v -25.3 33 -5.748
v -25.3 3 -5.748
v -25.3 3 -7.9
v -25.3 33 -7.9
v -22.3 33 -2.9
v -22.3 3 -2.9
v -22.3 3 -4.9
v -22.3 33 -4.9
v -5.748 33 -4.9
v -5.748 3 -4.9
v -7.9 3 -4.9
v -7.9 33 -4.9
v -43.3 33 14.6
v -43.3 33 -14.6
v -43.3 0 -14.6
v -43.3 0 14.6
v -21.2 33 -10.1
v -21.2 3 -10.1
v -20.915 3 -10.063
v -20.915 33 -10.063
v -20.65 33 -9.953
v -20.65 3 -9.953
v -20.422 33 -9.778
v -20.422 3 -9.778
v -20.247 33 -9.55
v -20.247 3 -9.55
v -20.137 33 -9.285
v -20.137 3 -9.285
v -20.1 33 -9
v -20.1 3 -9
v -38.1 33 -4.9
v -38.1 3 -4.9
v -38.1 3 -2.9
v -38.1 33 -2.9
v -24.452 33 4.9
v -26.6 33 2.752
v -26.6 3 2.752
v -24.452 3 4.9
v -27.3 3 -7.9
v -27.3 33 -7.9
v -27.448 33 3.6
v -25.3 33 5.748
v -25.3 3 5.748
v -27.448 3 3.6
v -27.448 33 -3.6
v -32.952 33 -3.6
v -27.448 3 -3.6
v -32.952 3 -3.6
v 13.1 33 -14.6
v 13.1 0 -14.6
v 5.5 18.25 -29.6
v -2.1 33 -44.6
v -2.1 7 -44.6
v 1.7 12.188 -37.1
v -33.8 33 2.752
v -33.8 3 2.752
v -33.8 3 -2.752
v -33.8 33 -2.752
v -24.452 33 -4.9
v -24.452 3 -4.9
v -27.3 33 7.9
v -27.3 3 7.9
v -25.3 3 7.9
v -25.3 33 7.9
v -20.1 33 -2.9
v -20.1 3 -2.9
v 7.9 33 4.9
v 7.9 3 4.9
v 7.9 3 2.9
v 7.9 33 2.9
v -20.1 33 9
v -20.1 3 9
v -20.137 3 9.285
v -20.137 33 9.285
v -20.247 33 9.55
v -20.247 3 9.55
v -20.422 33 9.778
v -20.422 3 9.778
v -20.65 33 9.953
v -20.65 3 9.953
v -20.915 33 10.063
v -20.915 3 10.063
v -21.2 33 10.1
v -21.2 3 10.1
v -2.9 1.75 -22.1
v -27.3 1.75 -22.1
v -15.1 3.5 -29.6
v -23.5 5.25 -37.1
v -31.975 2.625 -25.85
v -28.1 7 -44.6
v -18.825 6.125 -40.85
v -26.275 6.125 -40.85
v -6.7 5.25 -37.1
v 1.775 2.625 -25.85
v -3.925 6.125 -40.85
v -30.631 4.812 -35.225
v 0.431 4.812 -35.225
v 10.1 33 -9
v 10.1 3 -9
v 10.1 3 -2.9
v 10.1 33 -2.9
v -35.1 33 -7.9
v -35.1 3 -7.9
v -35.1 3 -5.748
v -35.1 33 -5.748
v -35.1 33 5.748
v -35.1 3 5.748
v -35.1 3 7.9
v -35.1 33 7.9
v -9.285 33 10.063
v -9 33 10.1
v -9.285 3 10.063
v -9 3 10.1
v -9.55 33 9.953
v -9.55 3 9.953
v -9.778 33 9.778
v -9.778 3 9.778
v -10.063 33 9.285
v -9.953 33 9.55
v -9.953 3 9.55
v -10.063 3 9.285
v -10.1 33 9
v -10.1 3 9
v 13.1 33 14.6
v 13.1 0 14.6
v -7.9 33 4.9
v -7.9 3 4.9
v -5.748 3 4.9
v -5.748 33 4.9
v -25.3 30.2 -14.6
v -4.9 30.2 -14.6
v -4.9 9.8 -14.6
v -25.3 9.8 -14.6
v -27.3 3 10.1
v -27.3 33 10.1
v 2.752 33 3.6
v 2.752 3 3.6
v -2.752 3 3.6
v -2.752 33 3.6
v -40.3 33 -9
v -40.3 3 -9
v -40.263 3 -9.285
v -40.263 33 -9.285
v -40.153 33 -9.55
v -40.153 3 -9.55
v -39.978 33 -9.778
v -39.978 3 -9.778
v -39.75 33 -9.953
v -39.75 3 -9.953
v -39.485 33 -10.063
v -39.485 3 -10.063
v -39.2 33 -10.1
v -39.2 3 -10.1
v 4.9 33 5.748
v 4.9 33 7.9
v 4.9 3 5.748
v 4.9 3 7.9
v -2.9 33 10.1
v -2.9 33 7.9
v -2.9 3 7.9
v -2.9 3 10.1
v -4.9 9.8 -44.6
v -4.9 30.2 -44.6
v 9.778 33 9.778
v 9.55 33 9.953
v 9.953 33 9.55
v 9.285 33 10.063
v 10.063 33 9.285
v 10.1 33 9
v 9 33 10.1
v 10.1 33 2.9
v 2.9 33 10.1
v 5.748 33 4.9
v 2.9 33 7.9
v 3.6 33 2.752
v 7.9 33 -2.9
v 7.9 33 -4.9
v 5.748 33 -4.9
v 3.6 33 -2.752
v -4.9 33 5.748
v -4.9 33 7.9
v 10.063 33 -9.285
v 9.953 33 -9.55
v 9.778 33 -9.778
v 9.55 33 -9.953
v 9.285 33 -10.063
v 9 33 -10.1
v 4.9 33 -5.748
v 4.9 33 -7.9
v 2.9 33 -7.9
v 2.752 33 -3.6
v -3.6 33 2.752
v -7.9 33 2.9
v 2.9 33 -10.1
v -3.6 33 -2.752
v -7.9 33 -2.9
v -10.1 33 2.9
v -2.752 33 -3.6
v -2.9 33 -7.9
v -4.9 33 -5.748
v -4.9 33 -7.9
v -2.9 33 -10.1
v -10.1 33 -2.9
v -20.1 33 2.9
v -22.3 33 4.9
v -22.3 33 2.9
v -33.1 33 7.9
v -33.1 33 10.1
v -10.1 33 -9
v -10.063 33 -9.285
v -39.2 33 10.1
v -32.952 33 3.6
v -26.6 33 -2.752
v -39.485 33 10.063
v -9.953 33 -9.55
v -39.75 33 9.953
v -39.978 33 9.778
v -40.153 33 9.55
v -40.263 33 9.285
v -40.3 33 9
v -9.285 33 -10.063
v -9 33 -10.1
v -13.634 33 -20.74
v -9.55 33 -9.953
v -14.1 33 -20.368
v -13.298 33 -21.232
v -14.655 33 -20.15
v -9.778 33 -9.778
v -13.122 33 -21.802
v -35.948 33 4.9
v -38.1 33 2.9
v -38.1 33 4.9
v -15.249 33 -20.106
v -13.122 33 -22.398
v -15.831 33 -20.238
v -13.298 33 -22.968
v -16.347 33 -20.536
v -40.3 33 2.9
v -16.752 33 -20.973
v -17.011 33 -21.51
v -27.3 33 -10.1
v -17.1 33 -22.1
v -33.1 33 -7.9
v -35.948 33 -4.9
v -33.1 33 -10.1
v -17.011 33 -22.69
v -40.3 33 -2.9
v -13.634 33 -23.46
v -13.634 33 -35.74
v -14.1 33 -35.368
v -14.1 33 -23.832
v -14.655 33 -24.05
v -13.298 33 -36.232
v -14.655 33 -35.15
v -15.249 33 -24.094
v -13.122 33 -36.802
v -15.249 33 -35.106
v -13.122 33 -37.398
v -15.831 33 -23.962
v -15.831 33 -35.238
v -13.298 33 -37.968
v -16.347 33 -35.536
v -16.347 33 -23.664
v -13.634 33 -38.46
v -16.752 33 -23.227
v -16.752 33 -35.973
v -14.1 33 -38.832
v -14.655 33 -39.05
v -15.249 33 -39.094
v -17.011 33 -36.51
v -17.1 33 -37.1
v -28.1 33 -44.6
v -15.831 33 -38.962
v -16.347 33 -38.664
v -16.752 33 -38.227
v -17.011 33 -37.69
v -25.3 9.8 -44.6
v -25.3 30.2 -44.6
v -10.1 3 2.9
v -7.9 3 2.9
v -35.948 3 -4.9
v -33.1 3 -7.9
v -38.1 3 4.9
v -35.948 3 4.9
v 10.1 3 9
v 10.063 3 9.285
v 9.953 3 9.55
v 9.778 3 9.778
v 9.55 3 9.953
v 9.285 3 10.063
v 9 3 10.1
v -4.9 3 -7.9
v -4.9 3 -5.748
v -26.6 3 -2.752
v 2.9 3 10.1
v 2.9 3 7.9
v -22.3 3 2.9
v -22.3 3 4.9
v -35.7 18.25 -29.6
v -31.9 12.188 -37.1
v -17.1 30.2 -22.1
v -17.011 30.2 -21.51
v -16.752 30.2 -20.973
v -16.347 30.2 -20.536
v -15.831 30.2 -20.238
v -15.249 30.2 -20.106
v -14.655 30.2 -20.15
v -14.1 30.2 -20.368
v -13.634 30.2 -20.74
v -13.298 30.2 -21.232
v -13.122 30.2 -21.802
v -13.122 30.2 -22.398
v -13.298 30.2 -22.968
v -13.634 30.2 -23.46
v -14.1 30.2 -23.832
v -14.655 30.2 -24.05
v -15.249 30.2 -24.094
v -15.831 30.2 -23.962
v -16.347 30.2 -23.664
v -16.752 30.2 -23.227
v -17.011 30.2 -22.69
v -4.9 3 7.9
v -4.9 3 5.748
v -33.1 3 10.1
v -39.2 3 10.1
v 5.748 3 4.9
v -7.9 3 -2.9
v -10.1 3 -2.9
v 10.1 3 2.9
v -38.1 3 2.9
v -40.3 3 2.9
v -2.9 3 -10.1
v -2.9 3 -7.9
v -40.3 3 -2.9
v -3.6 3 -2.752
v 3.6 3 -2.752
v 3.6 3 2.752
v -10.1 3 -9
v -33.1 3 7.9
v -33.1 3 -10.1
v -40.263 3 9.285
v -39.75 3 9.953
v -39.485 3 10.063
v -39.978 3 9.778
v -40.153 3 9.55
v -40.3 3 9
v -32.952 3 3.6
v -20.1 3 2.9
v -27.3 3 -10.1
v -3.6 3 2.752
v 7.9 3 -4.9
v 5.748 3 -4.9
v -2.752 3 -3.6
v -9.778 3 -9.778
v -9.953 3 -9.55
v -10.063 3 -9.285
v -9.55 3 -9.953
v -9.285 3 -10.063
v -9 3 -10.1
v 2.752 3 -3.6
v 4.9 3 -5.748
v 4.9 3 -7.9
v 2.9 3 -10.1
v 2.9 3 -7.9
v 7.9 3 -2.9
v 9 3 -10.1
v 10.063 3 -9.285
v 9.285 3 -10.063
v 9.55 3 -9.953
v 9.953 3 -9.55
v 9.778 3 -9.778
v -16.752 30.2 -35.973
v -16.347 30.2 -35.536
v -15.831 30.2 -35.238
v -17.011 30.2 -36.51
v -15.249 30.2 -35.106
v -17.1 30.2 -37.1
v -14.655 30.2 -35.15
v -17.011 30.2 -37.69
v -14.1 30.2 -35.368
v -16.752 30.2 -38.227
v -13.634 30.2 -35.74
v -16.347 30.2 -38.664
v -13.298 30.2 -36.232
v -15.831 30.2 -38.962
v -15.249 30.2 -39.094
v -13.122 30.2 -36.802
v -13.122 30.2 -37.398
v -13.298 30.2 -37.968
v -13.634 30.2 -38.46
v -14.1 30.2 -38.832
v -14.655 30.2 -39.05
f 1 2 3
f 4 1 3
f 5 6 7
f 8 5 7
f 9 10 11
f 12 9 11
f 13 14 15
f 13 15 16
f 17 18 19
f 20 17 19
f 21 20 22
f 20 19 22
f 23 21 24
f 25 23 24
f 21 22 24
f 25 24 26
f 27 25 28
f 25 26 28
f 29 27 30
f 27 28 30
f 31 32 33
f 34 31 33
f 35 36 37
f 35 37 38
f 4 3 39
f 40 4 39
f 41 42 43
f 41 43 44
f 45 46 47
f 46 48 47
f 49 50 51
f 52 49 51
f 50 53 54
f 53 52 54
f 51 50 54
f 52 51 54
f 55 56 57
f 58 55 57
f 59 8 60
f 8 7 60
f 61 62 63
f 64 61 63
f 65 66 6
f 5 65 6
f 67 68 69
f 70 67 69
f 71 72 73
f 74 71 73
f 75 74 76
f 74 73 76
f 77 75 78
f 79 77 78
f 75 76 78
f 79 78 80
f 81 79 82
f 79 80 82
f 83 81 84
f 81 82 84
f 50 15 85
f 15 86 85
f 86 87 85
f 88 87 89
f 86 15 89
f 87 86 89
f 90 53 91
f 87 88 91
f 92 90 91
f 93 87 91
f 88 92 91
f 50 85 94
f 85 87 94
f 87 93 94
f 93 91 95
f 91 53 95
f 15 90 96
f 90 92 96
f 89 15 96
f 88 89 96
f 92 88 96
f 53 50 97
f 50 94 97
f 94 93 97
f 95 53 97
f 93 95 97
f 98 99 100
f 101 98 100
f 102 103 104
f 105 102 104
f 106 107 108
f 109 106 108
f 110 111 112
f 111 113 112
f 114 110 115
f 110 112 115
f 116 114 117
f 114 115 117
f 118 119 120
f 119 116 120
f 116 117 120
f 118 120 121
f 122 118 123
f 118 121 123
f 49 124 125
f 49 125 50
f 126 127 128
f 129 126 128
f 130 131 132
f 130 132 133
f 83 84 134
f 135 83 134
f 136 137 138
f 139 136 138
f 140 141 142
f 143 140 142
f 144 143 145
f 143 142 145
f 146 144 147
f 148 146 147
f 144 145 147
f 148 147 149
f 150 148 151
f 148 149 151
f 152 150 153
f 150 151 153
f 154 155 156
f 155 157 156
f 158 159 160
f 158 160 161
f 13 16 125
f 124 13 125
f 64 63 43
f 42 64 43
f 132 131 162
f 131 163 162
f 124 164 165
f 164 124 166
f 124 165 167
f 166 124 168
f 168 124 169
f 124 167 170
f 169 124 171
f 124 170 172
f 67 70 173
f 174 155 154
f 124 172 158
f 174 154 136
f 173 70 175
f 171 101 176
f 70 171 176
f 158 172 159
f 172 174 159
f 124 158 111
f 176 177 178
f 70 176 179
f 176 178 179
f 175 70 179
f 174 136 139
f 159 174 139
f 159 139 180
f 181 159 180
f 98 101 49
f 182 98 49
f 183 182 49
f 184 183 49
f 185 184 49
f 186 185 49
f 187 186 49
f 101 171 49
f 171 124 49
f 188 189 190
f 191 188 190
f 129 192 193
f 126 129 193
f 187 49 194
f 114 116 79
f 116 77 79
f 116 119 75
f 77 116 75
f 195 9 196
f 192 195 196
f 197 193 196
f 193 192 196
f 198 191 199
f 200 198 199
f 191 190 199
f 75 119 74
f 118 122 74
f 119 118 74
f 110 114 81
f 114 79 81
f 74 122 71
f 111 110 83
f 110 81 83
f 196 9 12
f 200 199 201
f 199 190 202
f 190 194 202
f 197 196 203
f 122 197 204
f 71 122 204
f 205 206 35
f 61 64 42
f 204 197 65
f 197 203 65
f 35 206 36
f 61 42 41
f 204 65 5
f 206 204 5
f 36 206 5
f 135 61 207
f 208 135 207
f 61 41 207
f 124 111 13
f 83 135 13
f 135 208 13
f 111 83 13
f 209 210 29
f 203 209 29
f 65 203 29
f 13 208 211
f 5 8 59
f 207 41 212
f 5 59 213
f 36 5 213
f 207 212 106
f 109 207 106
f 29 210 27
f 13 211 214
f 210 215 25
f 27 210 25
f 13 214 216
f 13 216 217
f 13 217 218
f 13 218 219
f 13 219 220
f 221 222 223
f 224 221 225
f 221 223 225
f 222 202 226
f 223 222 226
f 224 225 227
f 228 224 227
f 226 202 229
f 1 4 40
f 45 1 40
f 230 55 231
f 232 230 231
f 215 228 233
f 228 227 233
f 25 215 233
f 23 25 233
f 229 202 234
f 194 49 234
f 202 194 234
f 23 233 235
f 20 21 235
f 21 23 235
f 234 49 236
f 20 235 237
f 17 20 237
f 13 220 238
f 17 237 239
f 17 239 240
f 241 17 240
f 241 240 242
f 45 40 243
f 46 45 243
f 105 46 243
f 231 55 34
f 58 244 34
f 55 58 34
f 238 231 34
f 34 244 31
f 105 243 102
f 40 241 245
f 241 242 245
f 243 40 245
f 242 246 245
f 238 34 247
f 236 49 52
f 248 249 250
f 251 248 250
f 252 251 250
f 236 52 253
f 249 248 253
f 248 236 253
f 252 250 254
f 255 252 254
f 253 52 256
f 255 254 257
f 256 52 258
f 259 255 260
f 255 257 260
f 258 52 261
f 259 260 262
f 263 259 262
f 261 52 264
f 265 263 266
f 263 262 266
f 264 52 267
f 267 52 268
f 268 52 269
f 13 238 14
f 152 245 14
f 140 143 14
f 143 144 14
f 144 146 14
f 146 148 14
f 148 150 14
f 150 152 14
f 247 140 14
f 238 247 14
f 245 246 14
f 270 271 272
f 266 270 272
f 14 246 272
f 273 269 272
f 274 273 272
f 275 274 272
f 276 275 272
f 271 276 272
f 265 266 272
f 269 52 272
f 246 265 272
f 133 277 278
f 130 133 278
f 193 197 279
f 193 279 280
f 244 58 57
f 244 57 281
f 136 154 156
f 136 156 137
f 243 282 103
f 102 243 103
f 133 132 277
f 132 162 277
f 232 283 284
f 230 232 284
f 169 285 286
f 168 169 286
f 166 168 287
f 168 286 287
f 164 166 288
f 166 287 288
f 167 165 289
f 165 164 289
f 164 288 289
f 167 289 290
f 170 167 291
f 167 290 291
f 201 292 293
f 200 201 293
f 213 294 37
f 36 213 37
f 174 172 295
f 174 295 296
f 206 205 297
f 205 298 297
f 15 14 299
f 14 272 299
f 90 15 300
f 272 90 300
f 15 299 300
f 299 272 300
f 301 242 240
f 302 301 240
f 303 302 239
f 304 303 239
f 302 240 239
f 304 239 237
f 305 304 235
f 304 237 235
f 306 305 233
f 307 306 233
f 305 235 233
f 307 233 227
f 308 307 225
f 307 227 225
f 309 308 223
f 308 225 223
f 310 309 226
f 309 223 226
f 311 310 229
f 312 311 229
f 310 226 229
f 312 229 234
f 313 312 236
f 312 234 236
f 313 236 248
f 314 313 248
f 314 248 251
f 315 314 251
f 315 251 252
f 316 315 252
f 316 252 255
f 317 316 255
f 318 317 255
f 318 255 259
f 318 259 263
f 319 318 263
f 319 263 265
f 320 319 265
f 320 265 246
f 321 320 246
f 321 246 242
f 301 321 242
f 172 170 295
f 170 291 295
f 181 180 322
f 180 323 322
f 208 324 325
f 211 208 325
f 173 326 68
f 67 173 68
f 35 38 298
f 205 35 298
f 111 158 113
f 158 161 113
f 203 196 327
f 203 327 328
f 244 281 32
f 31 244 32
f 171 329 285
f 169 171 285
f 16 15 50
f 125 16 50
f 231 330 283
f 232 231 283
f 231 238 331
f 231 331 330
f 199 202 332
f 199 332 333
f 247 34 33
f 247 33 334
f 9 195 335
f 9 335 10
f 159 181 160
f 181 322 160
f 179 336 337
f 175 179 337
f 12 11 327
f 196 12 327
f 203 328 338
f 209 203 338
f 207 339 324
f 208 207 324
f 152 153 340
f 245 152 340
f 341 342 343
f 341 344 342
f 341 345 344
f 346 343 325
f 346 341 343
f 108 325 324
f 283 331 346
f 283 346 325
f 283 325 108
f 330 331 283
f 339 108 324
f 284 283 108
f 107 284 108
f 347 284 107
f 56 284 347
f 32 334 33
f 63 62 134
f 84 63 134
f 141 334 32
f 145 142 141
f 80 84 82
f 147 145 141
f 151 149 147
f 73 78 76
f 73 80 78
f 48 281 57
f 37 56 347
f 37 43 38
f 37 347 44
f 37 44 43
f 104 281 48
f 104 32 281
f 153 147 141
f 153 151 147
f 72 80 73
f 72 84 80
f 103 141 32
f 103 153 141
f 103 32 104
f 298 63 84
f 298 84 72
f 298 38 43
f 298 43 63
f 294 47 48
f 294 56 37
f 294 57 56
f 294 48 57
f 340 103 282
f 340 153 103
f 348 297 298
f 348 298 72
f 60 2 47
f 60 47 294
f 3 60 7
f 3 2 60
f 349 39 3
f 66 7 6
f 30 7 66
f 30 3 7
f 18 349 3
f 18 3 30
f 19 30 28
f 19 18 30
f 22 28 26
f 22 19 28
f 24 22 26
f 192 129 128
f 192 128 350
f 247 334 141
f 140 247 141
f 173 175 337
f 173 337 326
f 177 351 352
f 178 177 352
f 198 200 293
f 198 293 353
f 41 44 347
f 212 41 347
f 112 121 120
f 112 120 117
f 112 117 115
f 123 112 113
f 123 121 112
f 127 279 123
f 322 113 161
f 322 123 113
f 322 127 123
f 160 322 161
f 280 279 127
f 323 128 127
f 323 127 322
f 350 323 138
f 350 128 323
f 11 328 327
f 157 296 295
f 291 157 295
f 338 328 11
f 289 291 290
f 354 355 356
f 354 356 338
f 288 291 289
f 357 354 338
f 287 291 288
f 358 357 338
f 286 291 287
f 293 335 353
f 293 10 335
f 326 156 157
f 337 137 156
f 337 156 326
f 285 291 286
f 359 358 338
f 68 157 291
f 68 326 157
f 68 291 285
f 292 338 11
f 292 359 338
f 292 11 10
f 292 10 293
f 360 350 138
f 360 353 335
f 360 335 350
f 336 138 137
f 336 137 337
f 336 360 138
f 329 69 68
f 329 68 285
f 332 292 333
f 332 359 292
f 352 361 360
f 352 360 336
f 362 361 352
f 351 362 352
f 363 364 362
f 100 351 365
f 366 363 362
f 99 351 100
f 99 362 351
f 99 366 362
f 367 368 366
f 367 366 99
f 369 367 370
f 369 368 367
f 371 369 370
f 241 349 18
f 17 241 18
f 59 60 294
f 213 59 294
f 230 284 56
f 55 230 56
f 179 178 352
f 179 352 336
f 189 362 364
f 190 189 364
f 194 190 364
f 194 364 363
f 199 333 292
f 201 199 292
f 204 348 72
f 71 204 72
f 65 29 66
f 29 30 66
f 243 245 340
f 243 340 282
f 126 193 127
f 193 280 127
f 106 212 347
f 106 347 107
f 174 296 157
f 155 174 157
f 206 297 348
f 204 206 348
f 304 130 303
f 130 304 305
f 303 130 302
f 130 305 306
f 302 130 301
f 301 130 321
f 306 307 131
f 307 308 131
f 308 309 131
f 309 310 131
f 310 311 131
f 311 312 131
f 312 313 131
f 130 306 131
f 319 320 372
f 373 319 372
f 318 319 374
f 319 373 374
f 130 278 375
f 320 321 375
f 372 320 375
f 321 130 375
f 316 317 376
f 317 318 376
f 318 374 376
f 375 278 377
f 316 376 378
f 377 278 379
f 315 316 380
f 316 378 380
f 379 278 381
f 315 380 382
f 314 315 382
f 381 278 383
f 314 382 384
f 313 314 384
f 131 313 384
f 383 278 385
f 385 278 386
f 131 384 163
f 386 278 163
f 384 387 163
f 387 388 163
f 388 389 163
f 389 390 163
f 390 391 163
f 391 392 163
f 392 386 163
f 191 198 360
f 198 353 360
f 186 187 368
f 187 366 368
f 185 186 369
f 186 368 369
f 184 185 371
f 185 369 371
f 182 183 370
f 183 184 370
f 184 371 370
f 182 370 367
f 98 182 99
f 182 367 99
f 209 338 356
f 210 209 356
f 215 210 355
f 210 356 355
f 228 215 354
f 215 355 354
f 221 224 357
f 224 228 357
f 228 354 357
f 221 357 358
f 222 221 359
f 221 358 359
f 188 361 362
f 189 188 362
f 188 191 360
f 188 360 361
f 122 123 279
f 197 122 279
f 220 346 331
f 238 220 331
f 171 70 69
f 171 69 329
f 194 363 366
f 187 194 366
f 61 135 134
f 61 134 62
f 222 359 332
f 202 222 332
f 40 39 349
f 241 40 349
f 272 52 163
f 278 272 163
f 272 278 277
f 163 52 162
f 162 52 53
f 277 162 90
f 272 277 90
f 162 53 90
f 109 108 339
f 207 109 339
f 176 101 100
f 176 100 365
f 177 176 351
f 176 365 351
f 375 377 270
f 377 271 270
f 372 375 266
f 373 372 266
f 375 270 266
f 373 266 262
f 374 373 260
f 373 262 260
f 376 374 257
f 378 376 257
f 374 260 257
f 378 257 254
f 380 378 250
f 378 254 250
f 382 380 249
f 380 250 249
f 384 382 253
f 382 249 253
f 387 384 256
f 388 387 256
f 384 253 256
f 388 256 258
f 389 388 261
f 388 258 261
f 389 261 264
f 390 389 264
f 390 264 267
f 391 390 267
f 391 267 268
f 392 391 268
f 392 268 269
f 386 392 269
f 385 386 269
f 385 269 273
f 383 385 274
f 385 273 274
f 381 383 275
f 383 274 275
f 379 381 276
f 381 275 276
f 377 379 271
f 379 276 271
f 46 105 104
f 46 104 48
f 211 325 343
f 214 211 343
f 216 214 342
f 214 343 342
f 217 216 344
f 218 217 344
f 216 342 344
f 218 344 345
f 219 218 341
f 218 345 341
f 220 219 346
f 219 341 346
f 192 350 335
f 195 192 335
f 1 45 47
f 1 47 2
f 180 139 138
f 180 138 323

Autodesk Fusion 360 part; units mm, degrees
sketch "Sketch1" plane through (0, 0, 0) normal (0, 1, 0) x (1, 0, 0)
  line L0 (7.9, 2.9) -> (7.9, 4.9)
  line L1 (-2.7515, -3.6) -> (-4.9, -5.7485)
  line L2 (2.9, -7.9) -> (4.9, -7.9)
  line L3 (-2.9, -7.9) -> (-2.9, -10.1)
  arc A0 (-10.1, -9) -> (-9, -10.1) centre (-9, -9) ccw
  line L4 (5.7485, 4.9) -> (3.6, 2.7515)
  line L5 (-7.9, 2.9) -> (-10.1, 2.9)
  line L6 (-4.9, -7.9) -> (-2.9, -7.9)
  line L7 (4.9, 5.7485) -> (4.9, 7.9)
  line L8 (10.1, 2.9) -> (7.9, 2.9)
  line L9 (9, -10.1) -> (2.9, -10.1)
  arc A1 (9, -10.1) -> (10.1, -9) centre (9, -9) ccw
  line L10 (4.9, -5.7485) -> (2.7515, -3.6)
  line L11 (5.7485, -4.9) -> (7.9, -4.9)
  line L12 (-10.1, 2.9) -> (-10.1, 9)
  line L13 (7.9, -2.9) -> (10.1, -2.9)
  line L14 (-3.6, 2.7515) -> (-5.7485, 4.9)
  line L15 (10.1, -2.9) -> (10.1, -9)
  line L16 (-2.9, 10.1) -> (-2.9, 7.9)
  line L17 (7.9, -4.9) -> (7.9, -2.9)
  line L18 (-3.6, -2.7515) -> (-3.6, 2.7515)
  line L19 (3.6, 2.7515) -> (3.6, -2.7515)
  line L20 (2.7515, -3.6) -> (-2.7515, -3.6)
  line L21 (-10.1, -9) -> (-10.1, -2.9)
  line L22 (10.1, 9) -> (10.1, 2.9)
  line L23 (2.9, 7.9) -> (2.9, 10.1)
  line L24 (7.9, 4.9) -> (5.7485, 4.9)
  line L25 (-2.9, -10.1) -> (-9, -10.1)
  line L26 (-2.7515, 3.6) -> (2.7515, 3.6)
  arc A2 (-9, 10.1) -> (-10.1, 9) centre (-9, 9) ccw
  line L27 (4.9, 7.9) -> (2.9, 7.9)
  line L28 (-7.9, -4.9) -> (-5.7485, -4.9)
  line L29 (2.9, 10.1) -> (9, 10.1)
  arc A3 (10.1, 9) -> (9, 10.1) centre (9, 9) ccw
  line L30 (-4.9, -5.7485) -> (-4.9, -7.9)
  line L31 (-7.9, -2.9) -> (-7.9, -4.9)
  line L32 (-4.9, 7.9) -> (-4.9, 5.7485)
  line L33 (2.7515, 3.6) -> (4.9, 5.7485)
  line L34 (-4.9, 5.7485) -> (-2.7515, 3.6)
  line L35 (-10.1, -2.9) -> (-7.9, -2.9)
  line L36 (3.6, -2.7515) -> (5.7485, -4.9)
  line L37 (4.9, -7.9) -> (4.9, -5.7485)
  line L38 (2.9, -10.1) -> (2.9, -7.9)
  line L39 (-5.7485, -4.9) -> (-3.6, -2.7515)
  line L40 (-7.9, 4.9) -> (-7.9, 2.9)
  line L41 (-2.9, 7.9) -> (-4.9, 7.9)
  line L42 (-9, 10.1) -> (-2.9, 10.1)
  line L43 (-5.7485, 4.9) -> (-7.9, 4.9)
  line L44 (-15.1, -14.6) -> (13.1, -14.6)
  line L45 (13.1, -14.6) -> (13.1, 14.6)
  line L46 (13.1, 14.6) -> (-15.1, 14.6)
  line L47 (-15.1, 14.6) -> (-15.1, -14.6)
  dimension "d1" = 3
  dimension "d2" = 5
  dimension "d3" = 4.5
  dimension "d4" = 4.5
extrude "Extrude1" add sketch "Sketch1" along normal blind 3 contours L0 L1 L2 L3 A0 L4 L5 L6 L7 L8 L9 A1 L10 L11 L12 L13 L14 L15 L16 L17 L18 L19 L20 L21 L22 L23 L24 L25 L26 A2 L27 L28 L29 A3 L30 L31 L32 L33 L34 L35 L36 L37 L38 L39 L40 L41 L42 L43 | L44 L45 L46 L47
extrude "Extrude2" add sketch "Sketch1" along normal blind 30 from surface at 3
mirror "Mirror1" about plane through (-15.1, 3, -14.6) normal (-1, 0, 0) of bodies 1 merged
ref_plane "WorkPlane1" through (-15.1, 16.5, -44.6) normal (0, 0, -1) x (-1, 0, 0)
sketch "Sketch2" plane through (0, 0, -44.6) normal (0, 0, -1) x (-1, 0, 0)
  line L0 (-13.1, 0) -> (43.3, 0)
  line L1 (43.3, 0) -> (43.3, 33)
  line L2 (43.3, 33) -> (-13.1, 33)
  line L3 (-13.1, 33) -> (-13.1, 0)
  line L4 (28.1, 33) -> (2.1, 33)
  line L5 (2.1, 33) -> (2.1, 7)
  line L6 (2.1, 7) -> (28.1, 7)
  line L7 (28.1, 7) -> (28.1, 33)
  line L8 (15.1, 33) -> (15.1, 0) construction
  line L9 (25.3, 30.2) -> (4.9, 30.2)
  line L10 (4.9, 30.2) -> (4.9, 9.8)
  line L11 (4.9, 9.8) -> (25.3, 9.8)
  line L12 (25.3, 9.8) -> (25.3, 30.2)
  dimension "d15" = 20.4
  dimension "d17" = 2.8
  dimension "d18" = 2.8
  dimension "d29" = 2.8
loft "Loft1" add profiles "Sketch2" section 1 face at (-5.7, 11, -14.6) section 2 contours L2 L4 L5 L6 L7 | L9 L10 L11 L12
extrude "Extrude3" cut sketch "Sketch2" against normal blind 30 contours L9 L10 L11 L12
sketch "Sketch3" plane through (0, 33, 0) normal (0, 1, 0) x (-1, 0, 0)
  line L0 (21.2, 10.1) -> (27.3, 10.1)
  line L1 (27.3, 10.1) -> (27.3, 7.9)
  line L2 (27.3, 7.9) -> (25.3, 7.9)
  line L3 (25.3, 7.9) -> (25.3, 5.7485)
  line L4 (25.3, 5.7485) -> (27.4485, 3.6)
  line L5 (27.4485, 3.6) -> (32.9515, 3.6)
  line L6 (32.9515, 3.6) -> (35.1, 5.7485)
  line L7 (35.1, 5.7485) -> (35.1, 7.9)
  line L8 (35.1, 7.9) -> (33.1, 7.9)
  line L9 (33.1, 7.9) -> (33.1, 10.1)
  line L10 (33.1, 10.1) -> (39.2, 10.1)
  arc A0 (40.3, 9) -> (39.2, 10.1) centre (39.2, 9) ccw
  line L11 (40.3, 9) -> (40.3, 2.9)
  line L12 (40.3, 2.9) -> (38.1, 2.9)
  line L13 (38.1, 2.9) -> (38.1, 4.9)
  line L14 (38.1, 4.9) -> (35.9485, 4.9)
  line L15 (35.9485, 4.9) -> (33.8, 2.7515)
  line L16 (33.8, 2.7515) -> (33.8, -2.7515)
  line L17 (33.8, -2.7515) -> (35.9485, -4.9)
  line L18 (35.9485, -4.9) -> (38.1, -4.9)
  line L19 (38.1, -4.9) -> (38.1, -2.9)
  line L20 (38.1, -2.9) -> (40.3, -2.9)
  line L21 (40.3, -2.9) -> (40.3, -9)
  arc A1 (39.2, -10.1) -> (40.3, -9) centre (39.2, -9) ccw
  line L22 (39.2, -10.1) -> (33.1, -10.1)
  line L23 (33.1, -10.1) -> (33.1, -7.9)
  line L24 (33.1, -7.9) -> (35.1, -7.9)
  line L25 (35.1, -7.9) -> (35.1, -5.7485)
  line L26 (35.1, -5.7485) -> (32.9515, -3.6)
  line L27 (32.9515, -3.6) -> (27.4485, -3.6)
  line L28 (27.4485, -3.6) -> (25.3, -5.7485)
  line L29 (25.3, -5.7485) -> (25.3, -7.9)
  line L30 (25.3, -7.9) -> (27.3, -7.9)
  line L31 (27.3, -7.9) -> (27.3, -10.1)
  line L32 (27.3, -10.1) -> (21.2, -10.1)
  arc A2 (20.1, -9) -> (21.2, -10.1) centre (21.2, -9) ccw
  line L33 (20.1, -9) -> (20.1, -2.9)
  line L34 (20.1, -2.9) -> (22.3, -2.9)
  line L35 (22.3, -2.9) -> (22.3, -4.9)
  line L36 (22.3, -4.9) -> (24.4515, -4.9)
  line L37 (24.4515, -4.9) -> (26.6, -2.7515)
  line L38 (26.6, -2.7515) -> (26.6, 2.7515)
  line L39 (26.6, 2.7515) -> (24.4515, 4.9)
  line L40 (24.4515, 4.9) -> (22.3, 4.9)
  line L41 (22.3, 4.9) -> (22.3, 2.9)
  line L42 (22.3, 2.9) -> (20.1, 2.9)
  line L43 (20.1, 2.9) -> (20.1, 9)
  arc A3 (21.2, 10.1) -> (20.1, 9) centre (21.2, 9) ccw
  line L44 (2.9, 10.1) -> (9, 10.1)
  arc A4 (10.1, 9) -> (9, 10.1) centre (9, 9) ccw
  line L45 (10.1, 9) -> (10.1, 2.9)
  line L46 (10.1, 2.9) -> (7.9, 2.9)
  line L47 (7.9, 2.9) -> (7.9, 4.9)
  line L48 (7.9, 4.9) -> (5.7485, 4.9)
  line L49 (5.7485, 4.9) -> (3.6, 2.7515)
  line L50 (3.6, 2.7515) -> (3.6, -2.7515)
  line L51 (3.6, -2.7515) -> (5.7485, -4.9)
  line L52 (5.7485, -4.9) -> (7.9, -4.9)
  line L53 (7.9, -4.9) -> (7.9, -2.9)
  line L54 (7.9, -2.9) -> (10.1, -2.9)
  line L55 (10.1, -2.9) -> (10.1, -9)
  arc A5 (9, -10.1) -> (10.1, -9) centre (9, -9) ccw
  line L56 (9, -10.1) -> (2.9, -10.1)
  line L57 (2.9, -10.1) -> (2.9, -7.9)
  line L58 (2.9, -7.9) -> (4.9, -7.9)
  line L59 (4.9, -7.9) -> (4.9, -5.7485)
  line L60 (4.9, -5.7485) -> (2.7515, -3.6)
  line L61 (2.7515, -3.6) -> (-2.7515, -3.6)
  line L62 (-2.7515, -3.6) -> (-4.9, -5.7485)
  line L63 (-4.9, -5.7485) -> (-4.9, -7.9)
  line L64 (-4.9, -7.9) -> (-2.9, -7.9)
  line L65 (-2.9, -7.9) -> (-2.9, -10.1)
  line L66 (-2.9, -10.1) -> (-9, -10.1)
  arc A6 (-10.1, -9) -> (-9, -10.1) centre (-9, -9) ccw
  line L67 (-10.1, -9) -> (-10.1, -2.9)
  line L68 (-10.1, -2.9) -> (-7.9, -2.9)
  line L69 (-7.9, -2.9) -> (-7.9, -4.9)
  line L70 (-7.9, -4.9) -> (-5.7485, -4.9)
  line L71 (-5.7485, -4.9) -> (-3.6, -2.7515)
  line L72 (-3.6, -2.7515) -> (-3.6, 2.7515)
  line L73 (-3.6, 2.7515) -> (-5.7485, 4.9)
  line L74 (-5.7485, 4.9) -> (-7.9, 4.9)
  line L75 (-7.9, 4.9) -> (-7.9, 2.9)
  line L76 (-7.9, 2.9) -> (-10.1, 2.9)
  line L77 (-10.1, 2.9) -> (-10.1, 9)
  arc A7 (-9, 10.1) -> (-10.1, 9) centre (-9, 9) ccw
  line L78 (-9, 10.1) -> (-2.9, 10.1)
  line L79 (-2.9, 10.1) -> (-2.9, 7.9)
  line L80 (-2.9, 7.9) -> (-4.9, 7.9)
  line L81 (-4.9, 7.9) -> (-4.9, 5.7485)
  line L82 (-4.9, 5.7485) -> (-2.7515, 3.6)
  line L83 (-2.7515, 3.6) -> (2.7515, 3.6)
  line L84 (2.7515, 3.6) -> (4.9, 5.7485)
  line L85 (4.9, 5.7485) -> (4.9, 7.9)
  line L86 (4.9, 7.9) -> (2.9, 7.9)
  line L87 (2.9, 7.9) -> (2.9, 10.1)
  line L88 (43.3, -14.6) -> (43.3, 14.6)
  line L89 (43.3, 14.6) -> (-13.1, 14.6)
  line L90 (-13.1, 14.6) -> (-13.1, -14.6)
  line L91 (-13.1, -14.6) -> (2.1, -44.6)
  line L92 (2.1, -44.6) -> (28.1, -44.6)
  line L93 (28.1, -44.6) -> (43.3, -14.6)
  line L94 (15.1, -44.6) -> (15.1, -17.6132) construction
  circle A8 centre (15.1, -37.1) radius 2
  circle A9 centre (15.1, -22.1) radius 2
  dimension "d23" = 4
  dimension "d24" = 7.5
  dimension "d25" = 15
extrude "Extrude4" cut sketch "Sketch3" against normal blind 4 contours A8 | A9
equation "d15 = 20 mm + 2 * gap"
equation "d17 = 3 mm - gap"
equation "d18 = 3 mm - gap"
equation "gap = 0.2 mm"
equation "d29 = 3 mm - gap"
